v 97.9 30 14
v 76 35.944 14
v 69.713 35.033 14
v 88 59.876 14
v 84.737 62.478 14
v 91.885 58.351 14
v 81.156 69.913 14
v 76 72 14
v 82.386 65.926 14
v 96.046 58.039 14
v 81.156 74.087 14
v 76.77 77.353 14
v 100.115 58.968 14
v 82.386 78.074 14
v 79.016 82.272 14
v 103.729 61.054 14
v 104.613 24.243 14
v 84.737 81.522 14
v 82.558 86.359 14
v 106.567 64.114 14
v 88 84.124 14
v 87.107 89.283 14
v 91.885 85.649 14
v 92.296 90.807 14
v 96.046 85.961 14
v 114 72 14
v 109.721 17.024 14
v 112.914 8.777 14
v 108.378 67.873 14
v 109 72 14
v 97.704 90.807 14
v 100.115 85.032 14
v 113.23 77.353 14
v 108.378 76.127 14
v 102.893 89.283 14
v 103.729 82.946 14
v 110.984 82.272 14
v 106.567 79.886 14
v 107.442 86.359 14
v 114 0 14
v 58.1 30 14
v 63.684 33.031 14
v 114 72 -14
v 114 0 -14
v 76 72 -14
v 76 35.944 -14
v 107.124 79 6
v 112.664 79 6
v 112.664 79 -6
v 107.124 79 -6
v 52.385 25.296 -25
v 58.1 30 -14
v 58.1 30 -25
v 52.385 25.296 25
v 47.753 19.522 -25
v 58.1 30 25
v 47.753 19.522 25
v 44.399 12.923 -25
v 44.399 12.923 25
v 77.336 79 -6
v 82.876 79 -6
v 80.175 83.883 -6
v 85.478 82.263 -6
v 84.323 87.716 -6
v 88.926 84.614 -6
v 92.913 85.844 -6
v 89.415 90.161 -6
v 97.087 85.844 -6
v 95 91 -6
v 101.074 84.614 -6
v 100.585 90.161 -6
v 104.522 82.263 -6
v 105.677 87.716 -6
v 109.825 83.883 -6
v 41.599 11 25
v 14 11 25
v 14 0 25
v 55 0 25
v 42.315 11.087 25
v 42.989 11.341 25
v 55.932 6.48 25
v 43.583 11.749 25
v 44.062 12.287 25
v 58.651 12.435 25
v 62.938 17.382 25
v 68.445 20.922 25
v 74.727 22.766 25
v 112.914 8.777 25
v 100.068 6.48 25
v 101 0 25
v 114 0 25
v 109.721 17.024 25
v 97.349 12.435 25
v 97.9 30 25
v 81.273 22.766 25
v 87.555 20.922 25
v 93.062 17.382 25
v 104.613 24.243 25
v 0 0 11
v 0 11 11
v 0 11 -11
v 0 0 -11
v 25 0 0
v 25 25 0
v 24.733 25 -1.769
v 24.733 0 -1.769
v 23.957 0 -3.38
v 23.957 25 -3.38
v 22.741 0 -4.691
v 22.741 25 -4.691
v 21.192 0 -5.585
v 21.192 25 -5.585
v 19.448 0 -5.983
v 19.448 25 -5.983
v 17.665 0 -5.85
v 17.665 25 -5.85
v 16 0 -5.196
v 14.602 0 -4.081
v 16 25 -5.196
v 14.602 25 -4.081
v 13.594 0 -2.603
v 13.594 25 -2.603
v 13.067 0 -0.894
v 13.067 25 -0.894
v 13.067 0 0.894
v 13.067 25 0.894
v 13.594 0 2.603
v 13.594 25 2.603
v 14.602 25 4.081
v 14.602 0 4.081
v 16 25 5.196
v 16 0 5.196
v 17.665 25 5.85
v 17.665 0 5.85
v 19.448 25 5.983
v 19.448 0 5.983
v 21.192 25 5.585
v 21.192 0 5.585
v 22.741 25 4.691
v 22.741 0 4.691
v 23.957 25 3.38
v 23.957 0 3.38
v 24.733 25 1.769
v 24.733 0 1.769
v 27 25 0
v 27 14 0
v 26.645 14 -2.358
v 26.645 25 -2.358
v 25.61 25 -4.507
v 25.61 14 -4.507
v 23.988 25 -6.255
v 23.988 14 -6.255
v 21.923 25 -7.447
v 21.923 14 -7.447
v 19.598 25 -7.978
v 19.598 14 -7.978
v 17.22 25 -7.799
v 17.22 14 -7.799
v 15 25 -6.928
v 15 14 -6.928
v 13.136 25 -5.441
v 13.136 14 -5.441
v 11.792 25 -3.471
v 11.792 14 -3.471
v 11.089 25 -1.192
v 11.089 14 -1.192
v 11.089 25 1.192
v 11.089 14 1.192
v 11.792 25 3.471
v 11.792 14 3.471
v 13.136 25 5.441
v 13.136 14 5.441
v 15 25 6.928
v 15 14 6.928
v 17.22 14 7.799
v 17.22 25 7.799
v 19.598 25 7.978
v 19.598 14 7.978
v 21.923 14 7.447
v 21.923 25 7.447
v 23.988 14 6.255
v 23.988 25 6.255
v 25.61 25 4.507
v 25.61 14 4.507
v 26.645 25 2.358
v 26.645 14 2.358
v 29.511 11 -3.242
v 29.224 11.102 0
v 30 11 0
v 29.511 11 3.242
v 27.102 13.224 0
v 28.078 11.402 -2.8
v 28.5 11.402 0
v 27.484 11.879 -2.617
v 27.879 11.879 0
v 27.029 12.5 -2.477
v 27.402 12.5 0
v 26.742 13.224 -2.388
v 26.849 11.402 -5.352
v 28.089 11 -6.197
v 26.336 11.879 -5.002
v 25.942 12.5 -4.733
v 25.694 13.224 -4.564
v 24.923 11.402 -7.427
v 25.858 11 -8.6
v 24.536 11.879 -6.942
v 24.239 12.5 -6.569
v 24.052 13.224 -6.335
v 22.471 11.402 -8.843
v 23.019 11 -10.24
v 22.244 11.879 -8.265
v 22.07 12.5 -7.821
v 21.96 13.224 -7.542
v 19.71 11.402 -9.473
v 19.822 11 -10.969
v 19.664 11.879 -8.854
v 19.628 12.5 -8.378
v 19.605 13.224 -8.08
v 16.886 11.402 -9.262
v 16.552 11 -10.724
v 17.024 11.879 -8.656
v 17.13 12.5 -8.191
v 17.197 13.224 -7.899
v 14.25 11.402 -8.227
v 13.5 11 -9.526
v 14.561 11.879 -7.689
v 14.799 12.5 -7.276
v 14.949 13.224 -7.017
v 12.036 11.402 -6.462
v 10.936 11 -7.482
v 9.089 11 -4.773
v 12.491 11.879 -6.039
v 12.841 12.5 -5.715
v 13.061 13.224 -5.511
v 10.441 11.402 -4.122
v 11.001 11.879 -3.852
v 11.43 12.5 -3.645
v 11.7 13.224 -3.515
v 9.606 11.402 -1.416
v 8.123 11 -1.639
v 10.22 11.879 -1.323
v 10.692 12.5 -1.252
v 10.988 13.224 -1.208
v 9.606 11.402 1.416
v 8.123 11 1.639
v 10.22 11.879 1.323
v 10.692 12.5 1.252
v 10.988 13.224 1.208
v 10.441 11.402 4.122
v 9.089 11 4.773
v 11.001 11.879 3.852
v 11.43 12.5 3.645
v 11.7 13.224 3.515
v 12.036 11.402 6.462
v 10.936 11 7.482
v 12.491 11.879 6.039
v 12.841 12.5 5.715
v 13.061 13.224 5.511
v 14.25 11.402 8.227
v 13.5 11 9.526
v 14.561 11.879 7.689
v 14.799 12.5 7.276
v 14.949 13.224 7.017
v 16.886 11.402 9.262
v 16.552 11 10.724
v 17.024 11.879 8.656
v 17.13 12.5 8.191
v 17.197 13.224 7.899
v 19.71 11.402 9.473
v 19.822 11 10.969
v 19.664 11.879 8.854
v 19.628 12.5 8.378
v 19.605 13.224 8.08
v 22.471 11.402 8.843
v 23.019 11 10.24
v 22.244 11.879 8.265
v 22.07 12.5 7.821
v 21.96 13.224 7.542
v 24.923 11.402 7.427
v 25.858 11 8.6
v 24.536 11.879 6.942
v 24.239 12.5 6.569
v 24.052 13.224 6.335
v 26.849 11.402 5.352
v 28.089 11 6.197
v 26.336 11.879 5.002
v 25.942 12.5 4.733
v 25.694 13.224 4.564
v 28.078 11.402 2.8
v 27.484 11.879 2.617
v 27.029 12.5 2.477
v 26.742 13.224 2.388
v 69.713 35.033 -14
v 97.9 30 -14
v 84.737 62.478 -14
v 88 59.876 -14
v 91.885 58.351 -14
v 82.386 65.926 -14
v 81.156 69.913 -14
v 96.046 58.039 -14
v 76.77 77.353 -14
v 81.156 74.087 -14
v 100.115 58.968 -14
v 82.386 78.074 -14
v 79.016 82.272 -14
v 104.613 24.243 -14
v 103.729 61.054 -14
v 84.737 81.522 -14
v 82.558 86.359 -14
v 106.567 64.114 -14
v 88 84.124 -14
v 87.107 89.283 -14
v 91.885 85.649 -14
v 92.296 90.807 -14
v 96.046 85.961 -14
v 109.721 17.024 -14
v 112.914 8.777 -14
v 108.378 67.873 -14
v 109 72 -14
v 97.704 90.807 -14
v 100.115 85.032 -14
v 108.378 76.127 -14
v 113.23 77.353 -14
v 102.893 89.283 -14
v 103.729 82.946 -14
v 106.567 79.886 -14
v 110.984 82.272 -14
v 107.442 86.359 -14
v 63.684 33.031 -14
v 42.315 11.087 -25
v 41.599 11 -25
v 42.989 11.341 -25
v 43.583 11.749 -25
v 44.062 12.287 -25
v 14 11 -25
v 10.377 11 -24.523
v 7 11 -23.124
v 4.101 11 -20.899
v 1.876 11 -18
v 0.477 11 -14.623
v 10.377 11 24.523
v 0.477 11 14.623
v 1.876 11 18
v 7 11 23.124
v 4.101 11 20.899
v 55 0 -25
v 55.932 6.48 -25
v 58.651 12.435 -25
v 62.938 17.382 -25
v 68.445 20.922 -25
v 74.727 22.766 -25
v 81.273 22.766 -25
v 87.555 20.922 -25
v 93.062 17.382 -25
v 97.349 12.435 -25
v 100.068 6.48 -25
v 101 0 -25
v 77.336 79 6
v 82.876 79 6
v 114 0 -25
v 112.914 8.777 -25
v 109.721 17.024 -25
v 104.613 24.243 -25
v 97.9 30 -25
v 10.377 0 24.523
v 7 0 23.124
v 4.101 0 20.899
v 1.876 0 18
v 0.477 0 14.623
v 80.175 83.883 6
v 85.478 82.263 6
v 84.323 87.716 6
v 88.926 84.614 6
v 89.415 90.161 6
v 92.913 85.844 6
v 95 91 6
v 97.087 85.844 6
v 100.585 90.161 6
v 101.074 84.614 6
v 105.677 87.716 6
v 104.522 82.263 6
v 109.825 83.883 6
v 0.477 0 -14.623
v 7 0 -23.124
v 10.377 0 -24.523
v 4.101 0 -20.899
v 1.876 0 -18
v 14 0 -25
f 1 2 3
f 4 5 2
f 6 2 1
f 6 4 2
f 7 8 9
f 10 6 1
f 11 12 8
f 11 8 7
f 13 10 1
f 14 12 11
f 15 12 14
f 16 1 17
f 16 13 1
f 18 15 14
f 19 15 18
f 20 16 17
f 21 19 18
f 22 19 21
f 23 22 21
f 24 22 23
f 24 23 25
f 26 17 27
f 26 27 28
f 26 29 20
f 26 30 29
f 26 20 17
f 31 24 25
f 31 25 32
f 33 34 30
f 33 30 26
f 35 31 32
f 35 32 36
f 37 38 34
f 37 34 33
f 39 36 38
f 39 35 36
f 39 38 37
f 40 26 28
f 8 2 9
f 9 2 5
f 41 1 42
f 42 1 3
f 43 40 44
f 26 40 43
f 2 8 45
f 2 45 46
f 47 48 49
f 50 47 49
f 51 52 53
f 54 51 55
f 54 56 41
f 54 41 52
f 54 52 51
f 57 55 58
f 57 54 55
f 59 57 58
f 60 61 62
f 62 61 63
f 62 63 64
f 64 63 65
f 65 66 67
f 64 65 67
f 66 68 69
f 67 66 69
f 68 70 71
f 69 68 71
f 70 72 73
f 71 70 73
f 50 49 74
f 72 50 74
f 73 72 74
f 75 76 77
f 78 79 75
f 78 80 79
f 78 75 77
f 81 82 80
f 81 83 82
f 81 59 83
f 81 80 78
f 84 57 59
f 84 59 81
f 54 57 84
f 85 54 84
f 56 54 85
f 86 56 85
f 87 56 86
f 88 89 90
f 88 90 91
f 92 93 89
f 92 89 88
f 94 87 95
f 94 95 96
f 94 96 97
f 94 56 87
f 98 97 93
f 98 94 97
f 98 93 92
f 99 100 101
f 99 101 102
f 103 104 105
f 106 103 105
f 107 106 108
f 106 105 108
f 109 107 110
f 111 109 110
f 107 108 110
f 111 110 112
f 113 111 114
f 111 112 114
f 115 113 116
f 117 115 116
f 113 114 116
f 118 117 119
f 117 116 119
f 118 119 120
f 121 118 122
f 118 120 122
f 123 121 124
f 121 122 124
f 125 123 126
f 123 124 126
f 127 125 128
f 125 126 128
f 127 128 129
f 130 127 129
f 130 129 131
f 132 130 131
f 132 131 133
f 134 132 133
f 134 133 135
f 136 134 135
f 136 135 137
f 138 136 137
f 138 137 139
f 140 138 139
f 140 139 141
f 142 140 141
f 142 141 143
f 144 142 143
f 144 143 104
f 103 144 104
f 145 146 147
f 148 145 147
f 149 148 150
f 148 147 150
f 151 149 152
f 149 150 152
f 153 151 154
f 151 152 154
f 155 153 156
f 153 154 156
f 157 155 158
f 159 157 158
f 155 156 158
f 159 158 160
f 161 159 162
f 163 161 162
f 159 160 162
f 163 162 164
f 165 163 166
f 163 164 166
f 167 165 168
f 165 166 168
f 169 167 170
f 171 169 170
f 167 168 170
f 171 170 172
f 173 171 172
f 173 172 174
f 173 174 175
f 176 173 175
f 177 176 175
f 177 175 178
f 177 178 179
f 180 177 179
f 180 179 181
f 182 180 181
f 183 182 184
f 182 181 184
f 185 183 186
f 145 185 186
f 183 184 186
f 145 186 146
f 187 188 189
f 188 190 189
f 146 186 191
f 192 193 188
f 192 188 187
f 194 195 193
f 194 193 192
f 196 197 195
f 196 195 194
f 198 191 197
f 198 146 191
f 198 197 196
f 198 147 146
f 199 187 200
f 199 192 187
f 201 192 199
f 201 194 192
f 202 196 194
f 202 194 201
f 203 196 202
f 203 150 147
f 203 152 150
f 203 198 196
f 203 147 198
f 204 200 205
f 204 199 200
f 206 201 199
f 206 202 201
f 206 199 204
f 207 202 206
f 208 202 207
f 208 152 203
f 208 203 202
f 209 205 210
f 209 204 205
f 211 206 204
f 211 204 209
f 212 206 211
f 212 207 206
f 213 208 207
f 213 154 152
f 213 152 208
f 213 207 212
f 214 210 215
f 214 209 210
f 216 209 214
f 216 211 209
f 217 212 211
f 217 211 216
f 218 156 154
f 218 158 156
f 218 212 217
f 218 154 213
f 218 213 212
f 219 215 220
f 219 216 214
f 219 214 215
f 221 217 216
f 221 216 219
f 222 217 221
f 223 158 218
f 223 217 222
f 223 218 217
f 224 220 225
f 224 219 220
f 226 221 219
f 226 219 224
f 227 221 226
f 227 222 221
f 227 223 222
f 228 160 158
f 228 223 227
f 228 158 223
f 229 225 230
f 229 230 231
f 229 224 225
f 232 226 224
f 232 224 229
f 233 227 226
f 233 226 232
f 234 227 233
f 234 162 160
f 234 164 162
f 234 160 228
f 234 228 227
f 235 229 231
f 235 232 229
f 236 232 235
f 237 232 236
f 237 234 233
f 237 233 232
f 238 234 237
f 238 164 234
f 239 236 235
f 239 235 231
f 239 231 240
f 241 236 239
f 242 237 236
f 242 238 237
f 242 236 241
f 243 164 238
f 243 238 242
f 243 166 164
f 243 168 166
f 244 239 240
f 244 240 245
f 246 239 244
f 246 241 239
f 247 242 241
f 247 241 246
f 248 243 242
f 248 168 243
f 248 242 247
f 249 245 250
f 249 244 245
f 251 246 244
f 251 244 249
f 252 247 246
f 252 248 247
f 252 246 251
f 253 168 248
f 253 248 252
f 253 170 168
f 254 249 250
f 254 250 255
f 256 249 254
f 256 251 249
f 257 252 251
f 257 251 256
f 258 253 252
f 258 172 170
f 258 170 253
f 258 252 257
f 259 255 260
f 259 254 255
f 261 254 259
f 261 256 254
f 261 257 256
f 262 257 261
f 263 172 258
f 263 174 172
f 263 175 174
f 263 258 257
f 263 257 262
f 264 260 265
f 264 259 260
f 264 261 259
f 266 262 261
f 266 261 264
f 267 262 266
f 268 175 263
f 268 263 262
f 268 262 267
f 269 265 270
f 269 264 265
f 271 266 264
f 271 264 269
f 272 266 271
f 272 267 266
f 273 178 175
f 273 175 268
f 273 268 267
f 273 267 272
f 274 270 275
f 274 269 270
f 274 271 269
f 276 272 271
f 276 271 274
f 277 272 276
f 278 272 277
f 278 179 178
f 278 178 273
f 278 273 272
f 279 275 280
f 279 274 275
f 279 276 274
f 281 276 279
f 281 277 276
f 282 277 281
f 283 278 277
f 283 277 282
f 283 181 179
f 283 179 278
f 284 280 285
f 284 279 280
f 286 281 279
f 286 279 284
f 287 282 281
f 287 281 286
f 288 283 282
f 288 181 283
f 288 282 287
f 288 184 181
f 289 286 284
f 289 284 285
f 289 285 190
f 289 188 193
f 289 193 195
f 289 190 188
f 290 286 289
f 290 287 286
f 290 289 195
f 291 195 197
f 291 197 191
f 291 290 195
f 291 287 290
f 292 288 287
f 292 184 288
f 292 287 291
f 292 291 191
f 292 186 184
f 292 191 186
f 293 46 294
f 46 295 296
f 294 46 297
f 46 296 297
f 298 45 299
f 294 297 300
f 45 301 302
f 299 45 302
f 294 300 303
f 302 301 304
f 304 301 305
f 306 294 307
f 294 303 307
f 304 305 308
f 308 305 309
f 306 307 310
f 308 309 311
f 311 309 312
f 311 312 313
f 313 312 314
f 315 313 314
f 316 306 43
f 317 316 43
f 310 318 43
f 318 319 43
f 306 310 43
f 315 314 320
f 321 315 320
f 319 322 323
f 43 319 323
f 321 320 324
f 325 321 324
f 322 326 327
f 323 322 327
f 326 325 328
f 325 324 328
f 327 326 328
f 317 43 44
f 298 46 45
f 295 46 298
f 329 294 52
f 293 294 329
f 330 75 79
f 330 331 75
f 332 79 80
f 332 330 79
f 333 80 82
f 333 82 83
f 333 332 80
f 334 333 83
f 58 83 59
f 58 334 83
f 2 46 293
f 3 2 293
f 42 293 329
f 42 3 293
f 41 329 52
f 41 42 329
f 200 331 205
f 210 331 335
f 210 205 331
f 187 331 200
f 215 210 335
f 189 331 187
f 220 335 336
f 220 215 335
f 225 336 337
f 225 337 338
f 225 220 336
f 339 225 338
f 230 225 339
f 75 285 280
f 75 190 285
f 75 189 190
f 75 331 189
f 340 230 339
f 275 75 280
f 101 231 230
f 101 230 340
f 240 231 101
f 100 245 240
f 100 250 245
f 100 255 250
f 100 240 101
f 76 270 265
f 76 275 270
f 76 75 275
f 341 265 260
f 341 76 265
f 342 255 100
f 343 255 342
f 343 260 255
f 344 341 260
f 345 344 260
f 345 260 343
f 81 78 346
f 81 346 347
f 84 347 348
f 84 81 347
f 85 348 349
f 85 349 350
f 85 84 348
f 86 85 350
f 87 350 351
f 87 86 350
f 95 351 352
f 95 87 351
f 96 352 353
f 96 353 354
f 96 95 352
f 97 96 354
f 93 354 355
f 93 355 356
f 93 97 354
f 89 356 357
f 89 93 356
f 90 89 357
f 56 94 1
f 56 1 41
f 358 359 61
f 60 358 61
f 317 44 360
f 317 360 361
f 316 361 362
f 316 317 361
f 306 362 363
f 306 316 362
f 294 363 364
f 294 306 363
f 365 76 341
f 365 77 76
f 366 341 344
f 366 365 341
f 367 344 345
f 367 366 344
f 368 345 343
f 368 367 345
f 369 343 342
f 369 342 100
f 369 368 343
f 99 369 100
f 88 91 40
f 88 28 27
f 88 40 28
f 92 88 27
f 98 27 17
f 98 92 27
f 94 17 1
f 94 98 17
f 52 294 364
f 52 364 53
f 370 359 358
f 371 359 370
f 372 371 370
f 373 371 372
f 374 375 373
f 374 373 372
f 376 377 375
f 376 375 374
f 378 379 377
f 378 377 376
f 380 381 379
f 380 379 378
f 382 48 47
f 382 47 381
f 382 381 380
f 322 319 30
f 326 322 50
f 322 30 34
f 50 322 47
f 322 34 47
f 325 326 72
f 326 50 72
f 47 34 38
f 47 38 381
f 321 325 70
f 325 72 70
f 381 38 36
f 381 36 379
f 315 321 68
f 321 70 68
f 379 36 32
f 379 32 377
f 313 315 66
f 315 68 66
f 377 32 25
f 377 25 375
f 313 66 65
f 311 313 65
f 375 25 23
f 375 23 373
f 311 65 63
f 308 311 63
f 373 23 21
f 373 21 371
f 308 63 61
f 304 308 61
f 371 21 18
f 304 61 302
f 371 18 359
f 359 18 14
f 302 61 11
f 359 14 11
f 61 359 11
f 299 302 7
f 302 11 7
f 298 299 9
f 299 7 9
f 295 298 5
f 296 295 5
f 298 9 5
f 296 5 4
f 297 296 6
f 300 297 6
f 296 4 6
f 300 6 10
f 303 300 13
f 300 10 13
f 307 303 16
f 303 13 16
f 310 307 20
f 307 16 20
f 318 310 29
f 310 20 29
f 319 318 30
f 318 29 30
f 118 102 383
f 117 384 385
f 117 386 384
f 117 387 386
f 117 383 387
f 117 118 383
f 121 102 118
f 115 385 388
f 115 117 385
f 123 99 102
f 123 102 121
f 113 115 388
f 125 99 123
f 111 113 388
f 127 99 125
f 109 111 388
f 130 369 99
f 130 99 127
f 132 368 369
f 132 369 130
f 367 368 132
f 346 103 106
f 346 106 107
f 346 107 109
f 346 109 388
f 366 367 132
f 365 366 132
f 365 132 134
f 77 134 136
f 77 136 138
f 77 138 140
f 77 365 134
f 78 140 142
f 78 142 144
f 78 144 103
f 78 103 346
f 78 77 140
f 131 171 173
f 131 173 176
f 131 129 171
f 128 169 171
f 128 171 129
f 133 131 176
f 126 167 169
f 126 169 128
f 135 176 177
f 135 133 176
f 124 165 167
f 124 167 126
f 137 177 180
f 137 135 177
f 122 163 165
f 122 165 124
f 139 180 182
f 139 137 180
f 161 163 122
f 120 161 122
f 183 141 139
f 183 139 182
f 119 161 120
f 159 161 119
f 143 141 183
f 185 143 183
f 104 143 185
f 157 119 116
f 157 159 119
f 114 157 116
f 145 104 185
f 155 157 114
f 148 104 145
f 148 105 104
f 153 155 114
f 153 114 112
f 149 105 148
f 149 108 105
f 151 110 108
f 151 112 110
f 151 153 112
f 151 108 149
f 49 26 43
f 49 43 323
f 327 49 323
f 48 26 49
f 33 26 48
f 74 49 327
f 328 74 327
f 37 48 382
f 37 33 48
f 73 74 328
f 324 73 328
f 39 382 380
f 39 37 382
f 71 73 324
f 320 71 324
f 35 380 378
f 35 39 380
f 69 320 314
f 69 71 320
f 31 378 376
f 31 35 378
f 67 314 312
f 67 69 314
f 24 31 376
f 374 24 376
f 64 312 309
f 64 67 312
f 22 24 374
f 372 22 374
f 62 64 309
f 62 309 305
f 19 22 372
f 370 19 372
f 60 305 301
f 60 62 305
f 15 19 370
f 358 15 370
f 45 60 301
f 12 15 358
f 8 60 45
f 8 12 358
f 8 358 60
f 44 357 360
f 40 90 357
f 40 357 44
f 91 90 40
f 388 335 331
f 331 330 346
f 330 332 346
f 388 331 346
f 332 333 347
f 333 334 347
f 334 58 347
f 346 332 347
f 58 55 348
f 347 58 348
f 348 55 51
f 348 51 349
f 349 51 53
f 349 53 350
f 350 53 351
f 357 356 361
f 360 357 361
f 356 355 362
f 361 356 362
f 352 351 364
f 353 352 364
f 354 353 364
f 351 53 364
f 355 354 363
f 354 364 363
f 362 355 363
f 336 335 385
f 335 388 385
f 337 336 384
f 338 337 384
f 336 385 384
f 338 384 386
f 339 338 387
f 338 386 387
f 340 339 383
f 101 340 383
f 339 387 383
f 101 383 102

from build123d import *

# Parameters (mm, degrees)
BOSS_EXTRUDE3_DEPTH = 25
BOSS_EXTRUDE4_DEPTH = 14
SKETCH9_R           = 14
CUT_EXTRUDE5_DEPTH  = 97
SKETCH10_W          = 12
SKETCH10_H          = 12
CUT_EXTRUDE6_DEPTH  = 97
SKETCH11_R          = 8
BOSS_EXTRUDE5_DEPTH = 14
FILLET3_R           = 14
SKETCH12_R          = 6
CUT_EXTRUDE8_DEPTH  = 54
FILLET4_R           = 3


with BuildPart() as part:
    # Sketch2 → Boss-Extrude3 (new body, symmetric)
    with BuildSketch(Plane.XY):
        with BuildLine():
            Line((0, 0), (55, 0))
            ThreePointArc((55, 0), (78, 23), (101, 0))
            Line((101, 0), (114, 0))
            ThreePointArc((114, 0), (109.720584442, 17.023645986), (97.899748742, 30))
            Line((97.899748742, 30), (58.100251258, 30))
            ThreePointArc((58.100251258, 30), (49.293476177, 21.724076274), (43.721726998, 11))
            Line((43.721726998, 11), (0, 11))
            Line((0, 11), (0, 0))
        make_face()
    extrude(amount=BOSS_EXTRUDE3_DEPTH, both=True)

    # Sketch7 → Boss-Extrude4 (add, symmetric)
    with BuildSketch(Plane.XY):
        with BuildLine():
            Line((114, 0), (114, 72))
            ThreePointArc((114, 72), (95, 91), (76, 72))
            Line((76, 72), (76, 35.944401511))
            ThreePointArc((76, 35.944401511), (66.65391142, 34.165278777), (58.100251258, 30))
            Line((58.100251258, 30), (97.899748742, 30))
            ThreePointArc((97.899748742, 30), (109.720584442, 17.023645986), (114, 0))
        make_face()
    extrude(amount=BOSS_EXTRUDE4_DEPTH, both=True)

    # Sketch9 → Cut-Extrude5 (cut)
    with BuildSketch(Plane.XY.offset(14)):
        with Locations((95, 72)):
            Circle(SKETCH9_R)
    extrude(amount=-CUT_EXTRUDE5_DEPTH, mode=Mode.SUBTRACT)

    # Sketch10 → Cut-Extrude6 (cut)
    with BuildSketch(Plane(origin=(114, 0, 0), x_dir=(0, 0, -1), z_dir=(1, 0, 0))):
        with Locations((0, 85)):
            Rectangle(SKETCH10_W, SKETCH10_H)
    extrude(amount=-CUT_EXTRUDE6_DEPTH, mode=Mode.SUBTRACT)

    # Sketch11 → Boss-Extrude5 (add)
    with BuildSketch(Plane(origin=(0, 11, 0), x_dir=(1, 0, 0), z_dir=(0, 1, 0))):
        with Locations((19, 0)):
            Circle(SKETCH11_R)
    extrude(amount=BOSS_EXTRUDE5_DEPTH)

    # Fillet3
    fillet3_edges = [part.edges().sort_by_distance(p)[0] for p in [
        (0, 5.5, -25),
        (0, 5.5, 25),
    ]]
    fillet(fillet3_edges, radius=FILLET3_R)

    # Sketch12 → Cut-Extrude8 (cut)
    with BuildSketch(Plane(origin=(0, 25, 0), x_dir=(1, 0, 0), z_dir=(0, 1, 0))):
        with Locations((19, 0)):
            Circle(SKETCH12_R)
    extrude(amount=-CUT_EXTRUDE8_DEPTH, mode=Mode.SUBTRACT)

    # Fillet4
    fillet4_edges = [part.edges().sort_by_distance(p)[0] for p in [
        (43.721726998, 11, 0),
        (11, 11, 0),
    ]]
    fillet(fillet4_edges, radius=FILLET4_R)


solid = part.part
